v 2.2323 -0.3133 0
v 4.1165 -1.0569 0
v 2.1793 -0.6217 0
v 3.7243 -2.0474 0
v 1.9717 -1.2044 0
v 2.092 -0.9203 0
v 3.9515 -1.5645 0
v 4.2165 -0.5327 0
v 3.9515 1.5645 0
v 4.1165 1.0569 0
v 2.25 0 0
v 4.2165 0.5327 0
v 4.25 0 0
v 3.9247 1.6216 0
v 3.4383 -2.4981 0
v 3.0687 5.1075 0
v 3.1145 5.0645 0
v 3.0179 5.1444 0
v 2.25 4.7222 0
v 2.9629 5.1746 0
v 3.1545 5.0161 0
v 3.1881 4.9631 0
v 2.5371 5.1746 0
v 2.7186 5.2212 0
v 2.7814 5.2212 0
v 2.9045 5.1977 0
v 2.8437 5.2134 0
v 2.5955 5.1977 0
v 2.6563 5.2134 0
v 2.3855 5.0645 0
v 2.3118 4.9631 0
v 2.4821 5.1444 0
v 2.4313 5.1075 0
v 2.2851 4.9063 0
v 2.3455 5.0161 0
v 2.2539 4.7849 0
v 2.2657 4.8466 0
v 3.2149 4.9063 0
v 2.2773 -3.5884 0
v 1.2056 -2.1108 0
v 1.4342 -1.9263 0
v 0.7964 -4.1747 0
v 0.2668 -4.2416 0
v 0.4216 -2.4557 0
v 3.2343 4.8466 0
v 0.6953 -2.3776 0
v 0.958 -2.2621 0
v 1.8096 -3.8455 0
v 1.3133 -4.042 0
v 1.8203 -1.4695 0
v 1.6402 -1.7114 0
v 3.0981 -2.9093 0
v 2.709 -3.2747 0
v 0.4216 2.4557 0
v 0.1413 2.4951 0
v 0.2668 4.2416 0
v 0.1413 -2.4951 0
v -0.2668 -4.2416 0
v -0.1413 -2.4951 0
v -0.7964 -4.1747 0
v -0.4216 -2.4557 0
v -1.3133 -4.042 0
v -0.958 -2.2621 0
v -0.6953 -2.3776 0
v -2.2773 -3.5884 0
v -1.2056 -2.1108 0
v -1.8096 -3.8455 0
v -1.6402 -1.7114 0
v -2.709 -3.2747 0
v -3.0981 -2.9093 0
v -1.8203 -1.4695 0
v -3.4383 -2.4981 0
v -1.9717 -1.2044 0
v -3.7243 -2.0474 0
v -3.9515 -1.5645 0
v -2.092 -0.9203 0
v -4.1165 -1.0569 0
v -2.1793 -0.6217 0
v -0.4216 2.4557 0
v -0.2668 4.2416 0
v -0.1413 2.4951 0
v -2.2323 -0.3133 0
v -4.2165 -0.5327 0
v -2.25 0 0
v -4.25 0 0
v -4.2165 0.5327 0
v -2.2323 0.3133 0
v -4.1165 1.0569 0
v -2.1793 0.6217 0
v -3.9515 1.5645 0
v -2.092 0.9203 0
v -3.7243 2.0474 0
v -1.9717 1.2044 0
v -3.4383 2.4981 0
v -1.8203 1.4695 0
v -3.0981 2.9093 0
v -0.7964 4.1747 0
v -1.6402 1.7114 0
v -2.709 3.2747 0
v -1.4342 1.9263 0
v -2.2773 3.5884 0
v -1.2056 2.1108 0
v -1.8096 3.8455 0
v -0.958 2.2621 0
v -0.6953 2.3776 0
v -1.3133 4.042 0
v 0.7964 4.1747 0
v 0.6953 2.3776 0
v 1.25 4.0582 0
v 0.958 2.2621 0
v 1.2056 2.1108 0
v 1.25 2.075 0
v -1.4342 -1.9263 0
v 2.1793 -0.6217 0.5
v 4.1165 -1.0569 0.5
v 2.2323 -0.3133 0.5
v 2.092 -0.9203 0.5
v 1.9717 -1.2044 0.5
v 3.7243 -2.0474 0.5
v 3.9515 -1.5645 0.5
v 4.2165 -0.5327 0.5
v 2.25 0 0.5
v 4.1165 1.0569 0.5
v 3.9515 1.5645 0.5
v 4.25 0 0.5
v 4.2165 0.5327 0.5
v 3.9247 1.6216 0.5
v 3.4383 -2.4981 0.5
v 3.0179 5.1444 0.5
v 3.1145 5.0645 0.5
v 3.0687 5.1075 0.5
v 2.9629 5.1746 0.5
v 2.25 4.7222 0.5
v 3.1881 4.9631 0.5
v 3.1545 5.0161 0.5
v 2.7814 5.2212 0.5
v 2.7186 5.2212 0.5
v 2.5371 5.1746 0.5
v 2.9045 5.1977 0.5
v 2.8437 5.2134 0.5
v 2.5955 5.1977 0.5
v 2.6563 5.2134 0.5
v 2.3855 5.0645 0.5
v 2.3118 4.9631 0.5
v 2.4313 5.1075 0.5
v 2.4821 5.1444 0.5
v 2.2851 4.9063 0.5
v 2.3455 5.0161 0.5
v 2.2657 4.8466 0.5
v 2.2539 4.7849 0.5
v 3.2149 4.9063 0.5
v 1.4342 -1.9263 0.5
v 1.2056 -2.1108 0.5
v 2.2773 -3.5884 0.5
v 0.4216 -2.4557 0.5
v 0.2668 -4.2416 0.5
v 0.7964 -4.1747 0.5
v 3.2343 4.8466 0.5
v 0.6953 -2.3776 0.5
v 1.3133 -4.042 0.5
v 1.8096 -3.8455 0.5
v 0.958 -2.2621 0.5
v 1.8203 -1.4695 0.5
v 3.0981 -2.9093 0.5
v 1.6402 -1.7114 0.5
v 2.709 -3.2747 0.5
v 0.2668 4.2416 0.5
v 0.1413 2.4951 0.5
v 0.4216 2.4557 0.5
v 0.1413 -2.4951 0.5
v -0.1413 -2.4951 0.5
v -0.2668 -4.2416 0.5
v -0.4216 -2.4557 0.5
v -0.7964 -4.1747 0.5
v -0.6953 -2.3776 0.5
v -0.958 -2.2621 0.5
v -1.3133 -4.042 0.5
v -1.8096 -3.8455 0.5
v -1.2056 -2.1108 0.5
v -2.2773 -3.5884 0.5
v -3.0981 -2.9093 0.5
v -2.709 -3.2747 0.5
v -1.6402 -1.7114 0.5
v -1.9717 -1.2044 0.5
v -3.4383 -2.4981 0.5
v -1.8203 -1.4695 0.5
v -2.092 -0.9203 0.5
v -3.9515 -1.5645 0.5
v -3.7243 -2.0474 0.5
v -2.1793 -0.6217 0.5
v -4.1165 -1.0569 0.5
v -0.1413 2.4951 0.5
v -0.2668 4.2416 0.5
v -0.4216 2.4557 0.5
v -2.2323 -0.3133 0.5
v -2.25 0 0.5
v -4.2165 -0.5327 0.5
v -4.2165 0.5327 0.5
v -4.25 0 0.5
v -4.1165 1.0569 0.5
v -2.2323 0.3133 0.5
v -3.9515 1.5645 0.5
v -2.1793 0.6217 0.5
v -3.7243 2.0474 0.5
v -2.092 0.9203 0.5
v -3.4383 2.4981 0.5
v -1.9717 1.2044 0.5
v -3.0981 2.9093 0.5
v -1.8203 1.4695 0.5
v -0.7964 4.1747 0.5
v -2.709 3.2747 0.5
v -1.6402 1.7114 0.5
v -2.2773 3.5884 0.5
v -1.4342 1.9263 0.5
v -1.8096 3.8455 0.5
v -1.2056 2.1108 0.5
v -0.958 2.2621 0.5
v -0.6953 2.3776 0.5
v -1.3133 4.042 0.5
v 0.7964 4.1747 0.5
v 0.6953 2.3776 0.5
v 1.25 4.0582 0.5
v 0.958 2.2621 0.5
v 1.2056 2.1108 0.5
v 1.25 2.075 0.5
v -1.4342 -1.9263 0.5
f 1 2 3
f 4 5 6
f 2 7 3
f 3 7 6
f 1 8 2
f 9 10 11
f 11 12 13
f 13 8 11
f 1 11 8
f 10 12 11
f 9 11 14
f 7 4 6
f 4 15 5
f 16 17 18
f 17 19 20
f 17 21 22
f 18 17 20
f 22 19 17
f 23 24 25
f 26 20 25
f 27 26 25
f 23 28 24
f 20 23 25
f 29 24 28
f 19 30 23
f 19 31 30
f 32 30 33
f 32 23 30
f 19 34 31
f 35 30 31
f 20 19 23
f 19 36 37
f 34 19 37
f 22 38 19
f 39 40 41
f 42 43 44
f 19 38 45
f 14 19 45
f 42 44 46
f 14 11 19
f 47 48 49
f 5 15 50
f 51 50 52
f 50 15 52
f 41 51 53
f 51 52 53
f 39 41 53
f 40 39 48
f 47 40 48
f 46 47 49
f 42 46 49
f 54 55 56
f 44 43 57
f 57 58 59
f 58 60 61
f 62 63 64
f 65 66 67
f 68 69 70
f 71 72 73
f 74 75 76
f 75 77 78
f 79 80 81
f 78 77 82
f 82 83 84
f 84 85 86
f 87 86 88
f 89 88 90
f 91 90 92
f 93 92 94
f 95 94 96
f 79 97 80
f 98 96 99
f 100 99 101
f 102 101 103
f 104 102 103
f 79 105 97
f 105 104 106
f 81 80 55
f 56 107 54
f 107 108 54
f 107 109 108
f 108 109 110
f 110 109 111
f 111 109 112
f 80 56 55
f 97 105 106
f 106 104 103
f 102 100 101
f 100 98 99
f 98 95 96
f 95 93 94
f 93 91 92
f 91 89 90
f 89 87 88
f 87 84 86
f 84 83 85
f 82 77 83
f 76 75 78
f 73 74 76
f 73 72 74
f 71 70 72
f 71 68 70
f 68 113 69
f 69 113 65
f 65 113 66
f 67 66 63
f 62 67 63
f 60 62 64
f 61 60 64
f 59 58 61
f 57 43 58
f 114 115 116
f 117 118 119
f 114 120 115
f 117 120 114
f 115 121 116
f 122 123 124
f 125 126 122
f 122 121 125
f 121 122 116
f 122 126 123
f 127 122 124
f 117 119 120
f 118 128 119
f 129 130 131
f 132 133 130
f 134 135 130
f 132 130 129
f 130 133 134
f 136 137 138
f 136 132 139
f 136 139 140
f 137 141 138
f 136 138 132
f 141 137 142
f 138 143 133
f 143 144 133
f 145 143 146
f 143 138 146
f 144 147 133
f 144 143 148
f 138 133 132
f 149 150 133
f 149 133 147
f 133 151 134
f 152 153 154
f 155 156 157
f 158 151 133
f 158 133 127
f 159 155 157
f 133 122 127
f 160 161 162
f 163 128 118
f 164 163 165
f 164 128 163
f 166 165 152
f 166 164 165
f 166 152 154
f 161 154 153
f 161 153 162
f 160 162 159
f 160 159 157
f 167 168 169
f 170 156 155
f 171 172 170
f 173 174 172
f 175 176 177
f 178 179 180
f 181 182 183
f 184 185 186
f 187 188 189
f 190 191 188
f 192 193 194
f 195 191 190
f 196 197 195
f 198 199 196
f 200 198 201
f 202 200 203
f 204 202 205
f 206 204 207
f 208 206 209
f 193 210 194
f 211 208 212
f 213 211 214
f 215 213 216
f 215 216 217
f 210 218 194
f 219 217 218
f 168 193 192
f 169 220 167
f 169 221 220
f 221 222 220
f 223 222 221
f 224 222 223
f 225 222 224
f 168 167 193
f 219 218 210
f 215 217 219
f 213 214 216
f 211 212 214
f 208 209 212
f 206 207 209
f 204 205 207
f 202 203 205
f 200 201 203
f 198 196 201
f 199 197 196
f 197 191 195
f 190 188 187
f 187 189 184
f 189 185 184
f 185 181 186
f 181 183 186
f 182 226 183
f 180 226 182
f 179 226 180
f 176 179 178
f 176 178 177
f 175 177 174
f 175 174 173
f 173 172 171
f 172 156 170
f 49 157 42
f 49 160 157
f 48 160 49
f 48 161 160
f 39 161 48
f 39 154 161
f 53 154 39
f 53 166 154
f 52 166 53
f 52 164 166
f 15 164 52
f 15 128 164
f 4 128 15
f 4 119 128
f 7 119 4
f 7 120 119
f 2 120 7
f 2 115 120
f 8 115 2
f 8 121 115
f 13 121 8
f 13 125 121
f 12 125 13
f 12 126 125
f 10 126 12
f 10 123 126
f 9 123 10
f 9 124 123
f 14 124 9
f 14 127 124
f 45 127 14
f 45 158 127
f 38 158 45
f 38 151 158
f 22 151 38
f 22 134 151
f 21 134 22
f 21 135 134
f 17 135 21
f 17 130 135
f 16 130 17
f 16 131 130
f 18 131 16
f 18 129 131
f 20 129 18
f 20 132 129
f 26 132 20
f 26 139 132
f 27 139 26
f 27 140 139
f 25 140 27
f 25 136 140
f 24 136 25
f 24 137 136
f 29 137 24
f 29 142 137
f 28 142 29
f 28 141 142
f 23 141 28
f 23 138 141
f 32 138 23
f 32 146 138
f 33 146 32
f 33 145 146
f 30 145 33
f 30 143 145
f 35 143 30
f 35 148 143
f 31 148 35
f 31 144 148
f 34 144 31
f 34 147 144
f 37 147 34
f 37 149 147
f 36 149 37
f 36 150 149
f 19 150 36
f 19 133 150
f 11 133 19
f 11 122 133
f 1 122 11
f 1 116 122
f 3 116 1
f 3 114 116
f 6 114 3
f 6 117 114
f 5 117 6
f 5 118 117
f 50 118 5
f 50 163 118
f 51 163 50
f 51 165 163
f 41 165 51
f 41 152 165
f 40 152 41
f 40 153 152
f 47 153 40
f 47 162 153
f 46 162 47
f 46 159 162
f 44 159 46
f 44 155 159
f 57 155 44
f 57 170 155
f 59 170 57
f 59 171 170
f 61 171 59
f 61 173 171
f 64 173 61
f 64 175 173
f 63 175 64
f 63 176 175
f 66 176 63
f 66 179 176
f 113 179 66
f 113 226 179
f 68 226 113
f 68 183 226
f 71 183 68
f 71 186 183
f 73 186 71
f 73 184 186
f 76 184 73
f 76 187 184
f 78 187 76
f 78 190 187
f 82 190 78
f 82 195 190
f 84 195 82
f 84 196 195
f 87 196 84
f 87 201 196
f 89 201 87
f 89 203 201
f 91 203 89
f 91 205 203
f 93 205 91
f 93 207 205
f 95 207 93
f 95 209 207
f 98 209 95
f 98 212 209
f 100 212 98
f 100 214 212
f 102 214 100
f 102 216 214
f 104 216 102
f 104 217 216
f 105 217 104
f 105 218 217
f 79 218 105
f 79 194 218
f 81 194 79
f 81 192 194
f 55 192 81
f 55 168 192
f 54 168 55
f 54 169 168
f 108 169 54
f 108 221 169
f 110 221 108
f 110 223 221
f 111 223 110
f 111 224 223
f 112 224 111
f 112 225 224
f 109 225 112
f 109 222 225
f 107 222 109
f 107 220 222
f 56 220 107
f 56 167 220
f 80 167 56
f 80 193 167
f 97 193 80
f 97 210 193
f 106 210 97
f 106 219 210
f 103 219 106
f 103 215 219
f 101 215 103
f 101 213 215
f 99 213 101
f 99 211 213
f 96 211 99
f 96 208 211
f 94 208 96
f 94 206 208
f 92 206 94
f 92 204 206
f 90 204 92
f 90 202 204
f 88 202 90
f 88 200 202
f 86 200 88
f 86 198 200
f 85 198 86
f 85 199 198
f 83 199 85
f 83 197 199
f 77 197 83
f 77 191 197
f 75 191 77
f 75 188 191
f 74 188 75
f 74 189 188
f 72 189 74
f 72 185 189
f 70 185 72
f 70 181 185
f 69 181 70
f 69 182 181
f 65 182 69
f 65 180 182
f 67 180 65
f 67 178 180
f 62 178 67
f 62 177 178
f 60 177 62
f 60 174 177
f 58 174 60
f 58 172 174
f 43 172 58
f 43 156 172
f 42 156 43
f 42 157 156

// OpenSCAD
// [FL_INDEX: keywords="openscad, 3d_parametric, Customizable_Stitch_Marker, csg_solid" | COT="Parametric OpenSCAD design from 3DCodeverse"]
// Title: Customizable Stitch Marker

$fn = 50 + 0;

needle_size = 3.5; // [2.0:US 0 \ GB 14, 2.1:JP 0, 2.25:US 1 GB 13, 2.4:JP 1, 2.5:2.5 mm, 2.7:JP 2, 2.75:US 2 \ GB 12, 3.0:GB 11 \ JP 3, 3.25:US 3 \ GB 10, 3.3:JP 4, 3.5:US 4, 3.6:JP 5, 3.75:US 5 \ GB 9, 3.9:JP 6, 4.0:US 6 \ GB 8, 4.2:JP 7, 4.5:US 7 \ GB 7 \ JP 8, 4.8:JP 9, 5.0:US 8 \ GB 6, 5.1:JP 10, 5.4:JP 11, 5.5:US 9 \ GB 5, 5.7:JP 12, 6.0:US 10 \ GB 4 \ JP 13, 6.3:JP 14, 6.5:US 10 ½ \ GB 3, 6.6:JP 15, 7.0:GB 2 \ JP 7 mm, 7.5:GB 1, 8.0:US 11 \ GB 0 \ JP 8mm, 9.0:US 13 \ GB 00 \ JP 9mm, 10.0:US 15 \ GB  000 \ JP 10mm, 12.0:US 17, 16.0:US 19, 19.0:US 35, 25.0:US 50]
width = 2; // [2:10]
thickness = 0.5; // [0.5, 1.0, 1.5, 2.0, 2.5, 3.0]
clearance = 0.5 + 0;
radius = (needle_size / 2 + width + clearance) / 0.9;
slot_width = 1 + 0;

linear_extrude(height = thickness) {
	difference() {
		union() {
			circle(r=needle_size / 2 + width + clearance );

			hull() {
				translate([radius * 0.9 - width / 2, 0, 0]) circle(r=width / 2);
				translate([radius * 0.9 - width * 3 / 4, radius, 0]) circle(r=width / 4);
			}
		}
		scale([0.9, 1, 1]) circle(r=(needle_size / 2 + clearance) / 0.9);
		translate([radius * 0.9 - width - slot_width, 0, -1]) square([slot_width, radius]);
	}
}
